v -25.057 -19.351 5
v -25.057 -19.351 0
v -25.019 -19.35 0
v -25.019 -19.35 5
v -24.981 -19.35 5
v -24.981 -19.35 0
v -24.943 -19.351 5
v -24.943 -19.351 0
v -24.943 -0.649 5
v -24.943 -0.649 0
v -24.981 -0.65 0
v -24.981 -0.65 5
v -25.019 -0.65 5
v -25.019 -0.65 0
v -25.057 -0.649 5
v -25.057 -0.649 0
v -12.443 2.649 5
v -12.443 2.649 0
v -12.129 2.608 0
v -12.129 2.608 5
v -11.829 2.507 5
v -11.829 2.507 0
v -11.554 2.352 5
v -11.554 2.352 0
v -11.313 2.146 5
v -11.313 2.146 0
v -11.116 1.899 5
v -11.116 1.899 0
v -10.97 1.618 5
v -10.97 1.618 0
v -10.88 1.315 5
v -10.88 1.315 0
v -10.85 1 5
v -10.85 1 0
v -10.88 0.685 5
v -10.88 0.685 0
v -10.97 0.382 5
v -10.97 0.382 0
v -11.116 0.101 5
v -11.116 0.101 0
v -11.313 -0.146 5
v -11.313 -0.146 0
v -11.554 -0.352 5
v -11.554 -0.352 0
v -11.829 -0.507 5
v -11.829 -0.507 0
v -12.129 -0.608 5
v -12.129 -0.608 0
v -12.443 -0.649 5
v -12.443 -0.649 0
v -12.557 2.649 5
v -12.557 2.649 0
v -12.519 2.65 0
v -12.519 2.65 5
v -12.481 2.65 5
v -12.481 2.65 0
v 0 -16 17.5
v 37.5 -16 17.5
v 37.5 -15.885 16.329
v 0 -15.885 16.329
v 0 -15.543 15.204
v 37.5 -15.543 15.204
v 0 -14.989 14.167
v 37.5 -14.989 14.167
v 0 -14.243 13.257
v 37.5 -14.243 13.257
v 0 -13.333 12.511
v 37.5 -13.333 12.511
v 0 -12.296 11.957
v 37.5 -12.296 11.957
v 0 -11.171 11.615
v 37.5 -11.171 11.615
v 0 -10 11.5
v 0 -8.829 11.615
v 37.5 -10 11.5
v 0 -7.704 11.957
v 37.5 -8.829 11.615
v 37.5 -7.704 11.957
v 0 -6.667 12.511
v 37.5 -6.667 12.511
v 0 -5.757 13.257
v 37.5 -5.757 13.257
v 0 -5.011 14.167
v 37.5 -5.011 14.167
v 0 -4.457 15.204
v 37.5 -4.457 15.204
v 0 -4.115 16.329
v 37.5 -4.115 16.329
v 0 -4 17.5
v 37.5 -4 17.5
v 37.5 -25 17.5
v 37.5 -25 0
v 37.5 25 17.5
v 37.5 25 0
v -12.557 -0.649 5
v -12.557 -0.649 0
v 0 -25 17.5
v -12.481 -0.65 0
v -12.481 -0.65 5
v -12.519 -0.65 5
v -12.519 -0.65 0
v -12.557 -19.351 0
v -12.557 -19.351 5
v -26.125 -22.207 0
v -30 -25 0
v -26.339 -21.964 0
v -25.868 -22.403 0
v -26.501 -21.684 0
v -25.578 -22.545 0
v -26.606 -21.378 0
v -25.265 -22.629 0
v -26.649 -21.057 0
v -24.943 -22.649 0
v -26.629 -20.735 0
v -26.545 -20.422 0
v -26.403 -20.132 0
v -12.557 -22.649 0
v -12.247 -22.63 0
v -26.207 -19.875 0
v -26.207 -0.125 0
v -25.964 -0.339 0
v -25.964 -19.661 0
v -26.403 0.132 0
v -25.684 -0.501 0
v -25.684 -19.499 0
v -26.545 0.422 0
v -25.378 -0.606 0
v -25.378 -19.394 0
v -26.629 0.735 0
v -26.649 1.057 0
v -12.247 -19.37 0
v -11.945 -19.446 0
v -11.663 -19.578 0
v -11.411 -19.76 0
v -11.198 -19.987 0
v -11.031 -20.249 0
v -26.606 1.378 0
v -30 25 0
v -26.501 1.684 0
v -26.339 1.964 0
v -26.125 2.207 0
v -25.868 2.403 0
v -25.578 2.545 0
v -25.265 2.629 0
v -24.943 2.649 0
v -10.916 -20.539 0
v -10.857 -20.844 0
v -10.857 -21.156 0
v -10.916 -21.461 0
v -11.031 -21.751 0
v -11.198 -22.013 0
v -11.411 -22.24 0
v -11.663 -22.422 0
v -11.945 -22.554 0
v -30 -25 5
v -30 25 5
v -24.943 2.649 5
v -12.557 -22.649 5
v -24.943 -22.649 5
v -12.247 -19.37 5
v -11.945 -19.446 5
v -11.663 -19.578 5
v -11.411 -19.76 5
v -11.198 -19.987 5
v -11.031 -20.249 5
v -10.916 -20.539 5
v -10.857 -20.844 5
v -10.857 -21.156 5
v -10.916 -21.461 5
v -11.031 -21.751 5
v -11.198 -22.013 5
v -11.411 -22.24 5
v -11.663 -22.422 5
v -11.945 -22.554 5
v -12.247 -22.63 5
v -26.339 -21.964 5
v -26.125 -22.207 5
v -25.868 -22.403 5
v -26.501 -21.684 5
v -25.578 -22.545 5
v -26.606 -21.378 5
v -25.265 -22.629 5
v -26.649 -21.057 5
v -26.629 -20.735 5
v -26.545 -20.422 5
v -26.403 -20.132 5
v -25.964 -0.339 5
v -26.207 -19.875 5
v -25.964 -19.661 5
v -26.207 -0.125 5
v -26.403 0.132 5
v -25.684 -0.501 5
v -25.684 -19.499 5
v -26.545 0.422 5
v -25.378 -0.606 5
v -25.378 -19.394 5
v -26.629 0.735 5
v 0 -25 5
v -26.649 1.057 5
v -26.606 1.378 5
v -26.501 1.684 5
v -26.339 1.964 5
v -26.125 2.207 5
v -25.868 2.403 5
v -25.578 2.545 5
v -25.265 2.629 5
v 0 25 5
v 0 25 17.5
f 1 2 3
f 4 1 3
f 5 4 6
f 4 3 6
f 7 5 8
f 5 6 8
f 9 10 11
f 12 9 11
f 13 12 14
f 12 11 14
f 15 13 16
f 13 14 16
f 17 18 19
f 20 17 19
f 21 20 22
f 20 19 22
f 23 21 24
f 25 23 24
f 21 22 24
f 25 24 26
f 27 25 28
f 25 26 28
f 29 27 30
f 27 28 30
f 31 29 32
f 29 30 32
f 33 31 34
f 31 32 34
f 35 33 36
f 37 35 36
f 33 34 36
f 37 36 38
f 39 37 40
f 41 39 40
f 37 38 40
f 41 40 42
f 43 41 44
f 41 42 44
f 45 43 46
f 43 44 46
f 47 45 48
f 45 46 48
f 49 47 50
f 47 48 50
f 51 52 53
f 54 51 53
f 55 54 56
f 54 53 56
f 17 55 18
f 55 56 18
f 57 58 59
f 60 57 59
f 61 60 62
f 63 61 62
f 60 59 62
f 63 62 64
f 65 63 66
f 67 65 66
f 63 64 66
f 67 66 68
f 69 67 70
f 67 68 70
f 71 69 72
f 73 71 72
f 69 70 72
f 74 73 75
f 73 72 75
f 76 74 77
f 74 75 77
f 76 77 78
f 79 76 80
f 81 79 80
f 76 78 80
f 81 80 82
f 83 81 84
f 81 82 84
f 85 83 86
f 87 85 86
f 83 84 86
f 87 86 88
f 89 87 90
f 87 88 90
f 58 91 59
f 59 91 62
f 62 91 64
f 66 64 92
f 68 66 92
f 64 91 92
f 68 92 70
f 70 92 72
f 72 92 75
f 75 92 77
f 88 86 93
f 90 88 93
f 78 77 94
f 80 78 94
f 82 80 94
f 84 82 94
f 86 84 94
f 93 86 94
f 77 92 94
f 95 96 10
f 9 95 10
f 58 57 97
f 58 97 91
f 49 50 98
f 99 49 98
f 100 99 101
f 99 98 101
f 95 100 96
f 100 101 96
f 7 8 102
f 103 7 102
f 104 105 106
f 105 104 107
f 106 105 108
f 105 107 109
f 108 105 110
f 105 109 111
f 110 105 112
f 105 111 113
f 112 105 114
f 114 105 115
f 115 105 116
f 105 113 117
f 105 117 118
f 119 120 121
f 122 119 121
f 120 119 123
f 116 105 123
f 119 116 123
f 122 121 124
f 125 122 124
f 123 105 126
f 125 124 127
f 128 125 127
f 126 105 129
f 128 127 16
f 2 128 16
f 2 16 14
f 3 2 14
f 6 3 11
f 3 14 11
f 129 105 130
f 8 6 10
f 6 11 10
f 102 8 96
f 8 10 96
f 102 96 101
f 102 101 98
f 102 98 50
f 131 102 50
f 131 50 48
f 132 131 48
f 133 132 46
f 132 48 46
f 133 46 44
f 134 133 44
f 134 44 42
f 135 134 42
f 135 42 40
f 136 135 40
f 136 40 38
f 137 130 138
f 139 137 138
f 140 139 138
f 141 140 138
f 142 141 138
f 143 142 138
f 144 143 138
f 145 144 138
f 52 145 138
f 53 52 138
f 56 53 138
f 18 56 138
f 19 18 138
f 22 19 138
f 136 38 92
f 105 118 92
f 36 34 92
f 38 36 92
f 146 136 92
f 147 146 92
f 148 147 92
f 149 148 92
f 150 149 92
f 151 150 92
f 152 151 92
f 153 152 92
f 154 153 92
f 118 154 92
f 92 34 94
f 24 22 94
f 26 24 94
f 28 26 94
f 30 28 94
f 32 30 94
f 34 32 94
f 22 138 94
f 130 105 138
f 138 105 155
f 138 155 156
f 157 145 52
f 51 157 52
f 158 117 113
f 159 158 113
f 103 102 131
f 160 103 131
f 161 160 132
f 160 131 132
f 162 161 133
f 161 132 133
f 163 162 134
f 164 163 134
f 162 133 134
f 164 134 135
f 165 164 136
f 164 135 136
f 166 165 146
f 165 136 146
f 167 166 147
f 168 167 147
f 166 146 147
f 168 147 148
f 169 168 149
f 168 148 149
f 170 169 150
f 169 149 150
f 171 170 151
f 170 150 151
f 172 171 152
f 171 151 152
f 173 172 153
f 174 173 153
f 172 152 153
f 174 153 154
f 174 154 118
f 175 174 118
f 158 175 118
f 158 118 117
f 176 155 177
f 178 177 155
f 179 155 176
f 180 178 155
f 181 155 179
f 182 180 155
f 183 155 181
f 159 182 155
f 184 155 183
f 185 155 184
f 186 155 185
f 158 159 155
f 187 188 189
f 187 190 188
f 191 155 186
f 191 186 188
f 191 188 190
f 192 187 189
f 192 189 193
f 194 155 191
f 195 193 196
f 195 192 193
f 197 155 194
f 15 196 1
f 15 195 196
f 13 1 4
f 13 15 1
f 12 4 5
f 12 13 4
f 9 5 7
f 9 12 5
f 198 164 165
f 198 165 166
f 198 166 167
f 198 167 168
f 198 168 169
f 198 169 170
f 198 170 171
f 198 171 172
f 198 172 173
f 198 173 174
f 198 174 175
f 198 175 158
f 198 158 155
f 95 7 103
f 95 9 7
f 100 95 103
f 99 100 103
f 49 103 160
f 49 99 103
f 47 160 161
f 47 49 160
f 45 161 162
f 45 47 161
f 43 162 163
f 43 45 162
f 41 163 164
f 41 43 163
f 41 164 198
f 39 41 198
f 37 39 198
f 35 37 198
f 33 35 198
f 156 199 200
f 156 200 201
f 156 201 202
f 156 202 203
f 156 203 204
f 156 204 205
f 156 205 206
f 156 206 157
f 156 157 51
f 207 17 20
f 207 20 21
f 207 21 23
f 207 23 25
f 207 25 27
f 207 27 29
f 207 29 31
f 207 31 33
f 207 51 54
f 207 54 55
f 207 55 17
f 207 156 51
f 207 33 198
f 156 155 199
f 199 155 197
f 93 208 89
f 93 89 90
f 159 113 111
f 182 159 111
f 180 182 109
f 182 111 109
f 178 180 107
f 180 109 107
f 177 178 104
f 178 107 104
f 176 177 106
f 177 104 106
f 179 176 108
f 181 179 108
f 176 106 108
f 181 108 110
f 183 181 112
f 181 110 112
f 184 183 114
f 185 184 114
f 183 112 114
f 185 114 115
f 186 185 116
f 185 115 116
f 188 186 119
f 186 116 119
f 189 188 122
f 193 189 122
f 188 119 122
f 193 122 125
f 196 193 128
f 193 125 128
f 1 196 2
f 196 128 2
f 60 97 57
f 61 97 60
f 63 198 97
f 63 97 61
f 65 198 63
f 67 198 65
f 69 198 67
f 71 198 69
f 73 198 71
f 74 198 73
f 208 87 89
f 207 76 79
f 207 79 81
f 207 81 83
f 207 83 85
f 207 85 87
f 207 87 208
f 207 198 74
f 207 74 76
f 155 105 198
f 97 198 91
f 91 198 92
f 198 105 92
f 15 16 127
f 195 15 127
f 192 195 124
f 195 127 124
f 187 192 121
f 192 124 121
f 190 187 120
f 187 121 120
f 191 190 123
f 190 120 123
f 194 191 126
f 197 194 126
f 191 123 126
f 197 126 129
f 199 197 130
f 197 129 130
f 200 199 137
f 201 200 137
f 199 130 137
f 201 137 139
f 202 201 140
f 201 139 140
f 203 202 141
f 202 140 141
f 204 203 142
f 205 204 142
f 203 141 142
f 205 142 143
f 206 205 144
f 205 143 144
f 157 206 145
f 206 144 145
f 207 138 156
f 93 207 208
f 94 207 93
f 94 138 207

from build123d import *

# Parameters (mm, degrees)
F0_W     = 60
F0_H     = 50
F1_DEPTH = 5
F2_W     = 37.5
F2_H     = 50
F3_DEPTH = 30
F4_R     = 6
F5_DEPTH = 37.5
F6_W     = 37.5
F6_H     = 50
F7_DEPTH = 12.5


with BuildPart() as f1:
    # F0 (on Top) → F1 (new body)
    with BuildSketch(Plane.XY):
        Rectangle(F0_W, F0_H)
        with BuildLine():
            Line((-22.5574357373, -19.3509999587), (-12.5574357373, -19.3509999587))
            ThreePointArc((-12.5574357373, -19.3509999587), (-10.85, -21), (-12.5574357373, -22.6490000413))
            Line((-12.5574357373, -22.6490000413), (-22.5574357373, -22.6490000413))
            Line((-22.5574357373, -22.6490000413), (-24.9425642627, -22.6490000413))
            ThreePointArc((-24.9425642627, -22.6490000413), (-26.6490000413, -21.0574357373), (-25.0574357373, -19.3509999587))
            ThreePointArc((-25.0574357373, -19.3509999587), (-25, -19.35), (-24.9425642627, -19.3509999587))
            Line((-24.9425642627, -19.3509999587), (-22.5574357373, -19.3509999587))
        make_face(mode=Mode.SUBTRACT)
        with BuildLine():
            ThreePointArc((-12.4425642627, -0.6490000413), (-12.5, -0.65), (-12.5574357373, -0.6490000413))
            Line((-12.5574357373, -0.6490000413), (-24.9425642627, -0.6490000413))
            ThreePointArc((-24.9425642627, -0.6490000413), (-25, -0.65), (-25.0574357373, -0.6490000413))
            ThreePointArc((-25.0574357373, -0.6490000413), (-26.6490000413, 1.0574357373), (-24.9425642627, 2.6490000413))
            Line((-24.9425642627, 2.6490000413), (-12.5574357373, 2.6490000413))
            ThreePointArc((-12.5574357373, 2.6490000413), (-12.5, 2.65), (-12.4425642627, 2.6490000413))
            ThreePointArc((-12.4425642627, 2.6490000413), (-10.85, 1), (-12.4425642627, -0.6490000413))
        make_face(mode=Mode.SUBTRACT)
    extrude(amount=F1_DEPTH)

    # F2 (on Top) → F3 (join)
    with BuildSketch(Plane.XY):
        with Locations((18.75, 0)):
            Rectangle(F2_W, F2_H)
    extrude(amount=F3_DEPTH)

    # F4 (on face) → F5 (cut, through all)
    with BuildSketch(Plane.YZ.offset(37.5)):
        with Locations((-10, 17.5)):
            Circle(F4_R)
    extrude(amount=-F5_DEPTH, mode=Mode.SUBTRACT)

    # F6 (on face) → F7 (cut)
    with BuildSketch(Plane.XY.offset(30)):
        with Locations((18.75, 0)):
            Rectangle(F6_W, F6_H)
    extrude(amount=-F7_DEPTH, mode=Mode.SUBTRACT)


solid = f1.part
